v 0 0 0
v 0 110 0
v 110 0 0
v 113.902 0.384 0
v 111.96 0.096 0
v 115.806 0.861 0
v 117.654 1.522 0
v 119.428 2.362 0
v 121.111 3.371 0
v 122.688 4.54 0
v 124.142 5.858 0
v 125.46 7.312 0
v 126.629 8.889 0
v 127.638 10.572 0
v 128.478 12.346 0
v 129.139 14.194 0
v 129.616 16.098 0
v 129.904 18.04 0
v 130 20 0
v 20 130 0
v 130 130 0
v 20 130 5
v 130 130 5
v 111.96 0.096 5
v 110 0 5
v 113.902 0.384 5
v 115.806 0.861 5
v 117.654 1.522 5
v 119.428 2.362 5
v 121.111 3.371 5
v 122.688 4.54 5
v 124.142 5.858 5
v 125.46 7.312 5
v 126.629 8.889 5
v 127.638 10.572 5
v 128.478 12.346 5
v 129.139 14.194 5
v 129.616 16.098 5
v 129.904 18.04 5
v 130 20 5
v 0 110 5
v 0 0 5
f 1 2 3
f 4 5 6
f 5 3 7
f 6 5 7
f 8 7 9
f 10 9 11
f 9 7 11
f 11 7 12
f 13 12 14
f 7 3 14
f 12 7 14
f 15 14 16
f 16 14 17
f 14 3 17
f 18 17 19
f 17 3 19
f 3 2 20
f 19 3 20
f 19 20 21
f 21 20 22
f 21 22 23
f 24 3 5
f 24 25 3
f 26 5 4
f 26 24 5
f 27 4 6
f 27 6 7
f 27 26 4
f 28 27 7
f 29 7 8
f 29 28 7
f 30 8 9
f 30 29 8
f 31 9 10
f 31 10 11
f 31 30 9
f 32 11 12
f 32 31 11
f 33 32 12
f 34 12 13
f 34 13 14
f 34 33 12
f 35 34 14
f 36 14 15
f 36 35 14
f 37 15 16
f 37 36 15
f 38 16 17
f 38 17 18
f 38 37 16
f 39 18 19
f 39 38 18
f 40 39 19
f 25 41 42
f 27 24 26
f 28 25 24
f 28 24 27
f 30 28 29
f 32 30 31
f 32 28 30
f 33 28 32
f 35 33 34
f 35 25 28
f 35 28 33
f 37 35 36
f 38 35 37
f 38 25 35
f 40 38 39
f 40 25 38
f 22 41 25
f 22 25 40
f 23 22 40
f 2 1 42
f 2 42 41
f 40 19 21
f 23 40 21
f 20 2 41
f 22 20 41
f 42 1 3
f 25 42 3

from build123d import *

# Parameters (mm, degrees)
SKETCH1_W           = 130
SKETCH1_H           = 130
BOSS_EXTRUDE1_DEPTH = 5
FILLET1_R           = 20
CHAMFER1_SIZE       = 20


with BuildPart() as part:
    # Sketch1 → Boss-Extrude1 (new body)
    with BuildSketch(Plane.XY):
        with Locations((65, 65)):
            Rectangle(SKETCH1_W, SKETCH1_H)
    extrude(amount=BOSS_EXTRUDE1_DEPTH)

    # Fillet1
    fillet1_edges = [part.edges().sort_by_distance(p)[0] for p in [
        (130, 0, 2.5),
    ]]
    fillet(fillet1_edges, radius=FILLET1_R)

    # Chamfer1
    chamfer1_edges = [part.edges().sort_by_distance(p)[0] for p in [
        (0, 130, 2.5),
    ]]
    chamfer(chamfer1_edges, length=CHAMFER1_SIZE)


solid = part.part
